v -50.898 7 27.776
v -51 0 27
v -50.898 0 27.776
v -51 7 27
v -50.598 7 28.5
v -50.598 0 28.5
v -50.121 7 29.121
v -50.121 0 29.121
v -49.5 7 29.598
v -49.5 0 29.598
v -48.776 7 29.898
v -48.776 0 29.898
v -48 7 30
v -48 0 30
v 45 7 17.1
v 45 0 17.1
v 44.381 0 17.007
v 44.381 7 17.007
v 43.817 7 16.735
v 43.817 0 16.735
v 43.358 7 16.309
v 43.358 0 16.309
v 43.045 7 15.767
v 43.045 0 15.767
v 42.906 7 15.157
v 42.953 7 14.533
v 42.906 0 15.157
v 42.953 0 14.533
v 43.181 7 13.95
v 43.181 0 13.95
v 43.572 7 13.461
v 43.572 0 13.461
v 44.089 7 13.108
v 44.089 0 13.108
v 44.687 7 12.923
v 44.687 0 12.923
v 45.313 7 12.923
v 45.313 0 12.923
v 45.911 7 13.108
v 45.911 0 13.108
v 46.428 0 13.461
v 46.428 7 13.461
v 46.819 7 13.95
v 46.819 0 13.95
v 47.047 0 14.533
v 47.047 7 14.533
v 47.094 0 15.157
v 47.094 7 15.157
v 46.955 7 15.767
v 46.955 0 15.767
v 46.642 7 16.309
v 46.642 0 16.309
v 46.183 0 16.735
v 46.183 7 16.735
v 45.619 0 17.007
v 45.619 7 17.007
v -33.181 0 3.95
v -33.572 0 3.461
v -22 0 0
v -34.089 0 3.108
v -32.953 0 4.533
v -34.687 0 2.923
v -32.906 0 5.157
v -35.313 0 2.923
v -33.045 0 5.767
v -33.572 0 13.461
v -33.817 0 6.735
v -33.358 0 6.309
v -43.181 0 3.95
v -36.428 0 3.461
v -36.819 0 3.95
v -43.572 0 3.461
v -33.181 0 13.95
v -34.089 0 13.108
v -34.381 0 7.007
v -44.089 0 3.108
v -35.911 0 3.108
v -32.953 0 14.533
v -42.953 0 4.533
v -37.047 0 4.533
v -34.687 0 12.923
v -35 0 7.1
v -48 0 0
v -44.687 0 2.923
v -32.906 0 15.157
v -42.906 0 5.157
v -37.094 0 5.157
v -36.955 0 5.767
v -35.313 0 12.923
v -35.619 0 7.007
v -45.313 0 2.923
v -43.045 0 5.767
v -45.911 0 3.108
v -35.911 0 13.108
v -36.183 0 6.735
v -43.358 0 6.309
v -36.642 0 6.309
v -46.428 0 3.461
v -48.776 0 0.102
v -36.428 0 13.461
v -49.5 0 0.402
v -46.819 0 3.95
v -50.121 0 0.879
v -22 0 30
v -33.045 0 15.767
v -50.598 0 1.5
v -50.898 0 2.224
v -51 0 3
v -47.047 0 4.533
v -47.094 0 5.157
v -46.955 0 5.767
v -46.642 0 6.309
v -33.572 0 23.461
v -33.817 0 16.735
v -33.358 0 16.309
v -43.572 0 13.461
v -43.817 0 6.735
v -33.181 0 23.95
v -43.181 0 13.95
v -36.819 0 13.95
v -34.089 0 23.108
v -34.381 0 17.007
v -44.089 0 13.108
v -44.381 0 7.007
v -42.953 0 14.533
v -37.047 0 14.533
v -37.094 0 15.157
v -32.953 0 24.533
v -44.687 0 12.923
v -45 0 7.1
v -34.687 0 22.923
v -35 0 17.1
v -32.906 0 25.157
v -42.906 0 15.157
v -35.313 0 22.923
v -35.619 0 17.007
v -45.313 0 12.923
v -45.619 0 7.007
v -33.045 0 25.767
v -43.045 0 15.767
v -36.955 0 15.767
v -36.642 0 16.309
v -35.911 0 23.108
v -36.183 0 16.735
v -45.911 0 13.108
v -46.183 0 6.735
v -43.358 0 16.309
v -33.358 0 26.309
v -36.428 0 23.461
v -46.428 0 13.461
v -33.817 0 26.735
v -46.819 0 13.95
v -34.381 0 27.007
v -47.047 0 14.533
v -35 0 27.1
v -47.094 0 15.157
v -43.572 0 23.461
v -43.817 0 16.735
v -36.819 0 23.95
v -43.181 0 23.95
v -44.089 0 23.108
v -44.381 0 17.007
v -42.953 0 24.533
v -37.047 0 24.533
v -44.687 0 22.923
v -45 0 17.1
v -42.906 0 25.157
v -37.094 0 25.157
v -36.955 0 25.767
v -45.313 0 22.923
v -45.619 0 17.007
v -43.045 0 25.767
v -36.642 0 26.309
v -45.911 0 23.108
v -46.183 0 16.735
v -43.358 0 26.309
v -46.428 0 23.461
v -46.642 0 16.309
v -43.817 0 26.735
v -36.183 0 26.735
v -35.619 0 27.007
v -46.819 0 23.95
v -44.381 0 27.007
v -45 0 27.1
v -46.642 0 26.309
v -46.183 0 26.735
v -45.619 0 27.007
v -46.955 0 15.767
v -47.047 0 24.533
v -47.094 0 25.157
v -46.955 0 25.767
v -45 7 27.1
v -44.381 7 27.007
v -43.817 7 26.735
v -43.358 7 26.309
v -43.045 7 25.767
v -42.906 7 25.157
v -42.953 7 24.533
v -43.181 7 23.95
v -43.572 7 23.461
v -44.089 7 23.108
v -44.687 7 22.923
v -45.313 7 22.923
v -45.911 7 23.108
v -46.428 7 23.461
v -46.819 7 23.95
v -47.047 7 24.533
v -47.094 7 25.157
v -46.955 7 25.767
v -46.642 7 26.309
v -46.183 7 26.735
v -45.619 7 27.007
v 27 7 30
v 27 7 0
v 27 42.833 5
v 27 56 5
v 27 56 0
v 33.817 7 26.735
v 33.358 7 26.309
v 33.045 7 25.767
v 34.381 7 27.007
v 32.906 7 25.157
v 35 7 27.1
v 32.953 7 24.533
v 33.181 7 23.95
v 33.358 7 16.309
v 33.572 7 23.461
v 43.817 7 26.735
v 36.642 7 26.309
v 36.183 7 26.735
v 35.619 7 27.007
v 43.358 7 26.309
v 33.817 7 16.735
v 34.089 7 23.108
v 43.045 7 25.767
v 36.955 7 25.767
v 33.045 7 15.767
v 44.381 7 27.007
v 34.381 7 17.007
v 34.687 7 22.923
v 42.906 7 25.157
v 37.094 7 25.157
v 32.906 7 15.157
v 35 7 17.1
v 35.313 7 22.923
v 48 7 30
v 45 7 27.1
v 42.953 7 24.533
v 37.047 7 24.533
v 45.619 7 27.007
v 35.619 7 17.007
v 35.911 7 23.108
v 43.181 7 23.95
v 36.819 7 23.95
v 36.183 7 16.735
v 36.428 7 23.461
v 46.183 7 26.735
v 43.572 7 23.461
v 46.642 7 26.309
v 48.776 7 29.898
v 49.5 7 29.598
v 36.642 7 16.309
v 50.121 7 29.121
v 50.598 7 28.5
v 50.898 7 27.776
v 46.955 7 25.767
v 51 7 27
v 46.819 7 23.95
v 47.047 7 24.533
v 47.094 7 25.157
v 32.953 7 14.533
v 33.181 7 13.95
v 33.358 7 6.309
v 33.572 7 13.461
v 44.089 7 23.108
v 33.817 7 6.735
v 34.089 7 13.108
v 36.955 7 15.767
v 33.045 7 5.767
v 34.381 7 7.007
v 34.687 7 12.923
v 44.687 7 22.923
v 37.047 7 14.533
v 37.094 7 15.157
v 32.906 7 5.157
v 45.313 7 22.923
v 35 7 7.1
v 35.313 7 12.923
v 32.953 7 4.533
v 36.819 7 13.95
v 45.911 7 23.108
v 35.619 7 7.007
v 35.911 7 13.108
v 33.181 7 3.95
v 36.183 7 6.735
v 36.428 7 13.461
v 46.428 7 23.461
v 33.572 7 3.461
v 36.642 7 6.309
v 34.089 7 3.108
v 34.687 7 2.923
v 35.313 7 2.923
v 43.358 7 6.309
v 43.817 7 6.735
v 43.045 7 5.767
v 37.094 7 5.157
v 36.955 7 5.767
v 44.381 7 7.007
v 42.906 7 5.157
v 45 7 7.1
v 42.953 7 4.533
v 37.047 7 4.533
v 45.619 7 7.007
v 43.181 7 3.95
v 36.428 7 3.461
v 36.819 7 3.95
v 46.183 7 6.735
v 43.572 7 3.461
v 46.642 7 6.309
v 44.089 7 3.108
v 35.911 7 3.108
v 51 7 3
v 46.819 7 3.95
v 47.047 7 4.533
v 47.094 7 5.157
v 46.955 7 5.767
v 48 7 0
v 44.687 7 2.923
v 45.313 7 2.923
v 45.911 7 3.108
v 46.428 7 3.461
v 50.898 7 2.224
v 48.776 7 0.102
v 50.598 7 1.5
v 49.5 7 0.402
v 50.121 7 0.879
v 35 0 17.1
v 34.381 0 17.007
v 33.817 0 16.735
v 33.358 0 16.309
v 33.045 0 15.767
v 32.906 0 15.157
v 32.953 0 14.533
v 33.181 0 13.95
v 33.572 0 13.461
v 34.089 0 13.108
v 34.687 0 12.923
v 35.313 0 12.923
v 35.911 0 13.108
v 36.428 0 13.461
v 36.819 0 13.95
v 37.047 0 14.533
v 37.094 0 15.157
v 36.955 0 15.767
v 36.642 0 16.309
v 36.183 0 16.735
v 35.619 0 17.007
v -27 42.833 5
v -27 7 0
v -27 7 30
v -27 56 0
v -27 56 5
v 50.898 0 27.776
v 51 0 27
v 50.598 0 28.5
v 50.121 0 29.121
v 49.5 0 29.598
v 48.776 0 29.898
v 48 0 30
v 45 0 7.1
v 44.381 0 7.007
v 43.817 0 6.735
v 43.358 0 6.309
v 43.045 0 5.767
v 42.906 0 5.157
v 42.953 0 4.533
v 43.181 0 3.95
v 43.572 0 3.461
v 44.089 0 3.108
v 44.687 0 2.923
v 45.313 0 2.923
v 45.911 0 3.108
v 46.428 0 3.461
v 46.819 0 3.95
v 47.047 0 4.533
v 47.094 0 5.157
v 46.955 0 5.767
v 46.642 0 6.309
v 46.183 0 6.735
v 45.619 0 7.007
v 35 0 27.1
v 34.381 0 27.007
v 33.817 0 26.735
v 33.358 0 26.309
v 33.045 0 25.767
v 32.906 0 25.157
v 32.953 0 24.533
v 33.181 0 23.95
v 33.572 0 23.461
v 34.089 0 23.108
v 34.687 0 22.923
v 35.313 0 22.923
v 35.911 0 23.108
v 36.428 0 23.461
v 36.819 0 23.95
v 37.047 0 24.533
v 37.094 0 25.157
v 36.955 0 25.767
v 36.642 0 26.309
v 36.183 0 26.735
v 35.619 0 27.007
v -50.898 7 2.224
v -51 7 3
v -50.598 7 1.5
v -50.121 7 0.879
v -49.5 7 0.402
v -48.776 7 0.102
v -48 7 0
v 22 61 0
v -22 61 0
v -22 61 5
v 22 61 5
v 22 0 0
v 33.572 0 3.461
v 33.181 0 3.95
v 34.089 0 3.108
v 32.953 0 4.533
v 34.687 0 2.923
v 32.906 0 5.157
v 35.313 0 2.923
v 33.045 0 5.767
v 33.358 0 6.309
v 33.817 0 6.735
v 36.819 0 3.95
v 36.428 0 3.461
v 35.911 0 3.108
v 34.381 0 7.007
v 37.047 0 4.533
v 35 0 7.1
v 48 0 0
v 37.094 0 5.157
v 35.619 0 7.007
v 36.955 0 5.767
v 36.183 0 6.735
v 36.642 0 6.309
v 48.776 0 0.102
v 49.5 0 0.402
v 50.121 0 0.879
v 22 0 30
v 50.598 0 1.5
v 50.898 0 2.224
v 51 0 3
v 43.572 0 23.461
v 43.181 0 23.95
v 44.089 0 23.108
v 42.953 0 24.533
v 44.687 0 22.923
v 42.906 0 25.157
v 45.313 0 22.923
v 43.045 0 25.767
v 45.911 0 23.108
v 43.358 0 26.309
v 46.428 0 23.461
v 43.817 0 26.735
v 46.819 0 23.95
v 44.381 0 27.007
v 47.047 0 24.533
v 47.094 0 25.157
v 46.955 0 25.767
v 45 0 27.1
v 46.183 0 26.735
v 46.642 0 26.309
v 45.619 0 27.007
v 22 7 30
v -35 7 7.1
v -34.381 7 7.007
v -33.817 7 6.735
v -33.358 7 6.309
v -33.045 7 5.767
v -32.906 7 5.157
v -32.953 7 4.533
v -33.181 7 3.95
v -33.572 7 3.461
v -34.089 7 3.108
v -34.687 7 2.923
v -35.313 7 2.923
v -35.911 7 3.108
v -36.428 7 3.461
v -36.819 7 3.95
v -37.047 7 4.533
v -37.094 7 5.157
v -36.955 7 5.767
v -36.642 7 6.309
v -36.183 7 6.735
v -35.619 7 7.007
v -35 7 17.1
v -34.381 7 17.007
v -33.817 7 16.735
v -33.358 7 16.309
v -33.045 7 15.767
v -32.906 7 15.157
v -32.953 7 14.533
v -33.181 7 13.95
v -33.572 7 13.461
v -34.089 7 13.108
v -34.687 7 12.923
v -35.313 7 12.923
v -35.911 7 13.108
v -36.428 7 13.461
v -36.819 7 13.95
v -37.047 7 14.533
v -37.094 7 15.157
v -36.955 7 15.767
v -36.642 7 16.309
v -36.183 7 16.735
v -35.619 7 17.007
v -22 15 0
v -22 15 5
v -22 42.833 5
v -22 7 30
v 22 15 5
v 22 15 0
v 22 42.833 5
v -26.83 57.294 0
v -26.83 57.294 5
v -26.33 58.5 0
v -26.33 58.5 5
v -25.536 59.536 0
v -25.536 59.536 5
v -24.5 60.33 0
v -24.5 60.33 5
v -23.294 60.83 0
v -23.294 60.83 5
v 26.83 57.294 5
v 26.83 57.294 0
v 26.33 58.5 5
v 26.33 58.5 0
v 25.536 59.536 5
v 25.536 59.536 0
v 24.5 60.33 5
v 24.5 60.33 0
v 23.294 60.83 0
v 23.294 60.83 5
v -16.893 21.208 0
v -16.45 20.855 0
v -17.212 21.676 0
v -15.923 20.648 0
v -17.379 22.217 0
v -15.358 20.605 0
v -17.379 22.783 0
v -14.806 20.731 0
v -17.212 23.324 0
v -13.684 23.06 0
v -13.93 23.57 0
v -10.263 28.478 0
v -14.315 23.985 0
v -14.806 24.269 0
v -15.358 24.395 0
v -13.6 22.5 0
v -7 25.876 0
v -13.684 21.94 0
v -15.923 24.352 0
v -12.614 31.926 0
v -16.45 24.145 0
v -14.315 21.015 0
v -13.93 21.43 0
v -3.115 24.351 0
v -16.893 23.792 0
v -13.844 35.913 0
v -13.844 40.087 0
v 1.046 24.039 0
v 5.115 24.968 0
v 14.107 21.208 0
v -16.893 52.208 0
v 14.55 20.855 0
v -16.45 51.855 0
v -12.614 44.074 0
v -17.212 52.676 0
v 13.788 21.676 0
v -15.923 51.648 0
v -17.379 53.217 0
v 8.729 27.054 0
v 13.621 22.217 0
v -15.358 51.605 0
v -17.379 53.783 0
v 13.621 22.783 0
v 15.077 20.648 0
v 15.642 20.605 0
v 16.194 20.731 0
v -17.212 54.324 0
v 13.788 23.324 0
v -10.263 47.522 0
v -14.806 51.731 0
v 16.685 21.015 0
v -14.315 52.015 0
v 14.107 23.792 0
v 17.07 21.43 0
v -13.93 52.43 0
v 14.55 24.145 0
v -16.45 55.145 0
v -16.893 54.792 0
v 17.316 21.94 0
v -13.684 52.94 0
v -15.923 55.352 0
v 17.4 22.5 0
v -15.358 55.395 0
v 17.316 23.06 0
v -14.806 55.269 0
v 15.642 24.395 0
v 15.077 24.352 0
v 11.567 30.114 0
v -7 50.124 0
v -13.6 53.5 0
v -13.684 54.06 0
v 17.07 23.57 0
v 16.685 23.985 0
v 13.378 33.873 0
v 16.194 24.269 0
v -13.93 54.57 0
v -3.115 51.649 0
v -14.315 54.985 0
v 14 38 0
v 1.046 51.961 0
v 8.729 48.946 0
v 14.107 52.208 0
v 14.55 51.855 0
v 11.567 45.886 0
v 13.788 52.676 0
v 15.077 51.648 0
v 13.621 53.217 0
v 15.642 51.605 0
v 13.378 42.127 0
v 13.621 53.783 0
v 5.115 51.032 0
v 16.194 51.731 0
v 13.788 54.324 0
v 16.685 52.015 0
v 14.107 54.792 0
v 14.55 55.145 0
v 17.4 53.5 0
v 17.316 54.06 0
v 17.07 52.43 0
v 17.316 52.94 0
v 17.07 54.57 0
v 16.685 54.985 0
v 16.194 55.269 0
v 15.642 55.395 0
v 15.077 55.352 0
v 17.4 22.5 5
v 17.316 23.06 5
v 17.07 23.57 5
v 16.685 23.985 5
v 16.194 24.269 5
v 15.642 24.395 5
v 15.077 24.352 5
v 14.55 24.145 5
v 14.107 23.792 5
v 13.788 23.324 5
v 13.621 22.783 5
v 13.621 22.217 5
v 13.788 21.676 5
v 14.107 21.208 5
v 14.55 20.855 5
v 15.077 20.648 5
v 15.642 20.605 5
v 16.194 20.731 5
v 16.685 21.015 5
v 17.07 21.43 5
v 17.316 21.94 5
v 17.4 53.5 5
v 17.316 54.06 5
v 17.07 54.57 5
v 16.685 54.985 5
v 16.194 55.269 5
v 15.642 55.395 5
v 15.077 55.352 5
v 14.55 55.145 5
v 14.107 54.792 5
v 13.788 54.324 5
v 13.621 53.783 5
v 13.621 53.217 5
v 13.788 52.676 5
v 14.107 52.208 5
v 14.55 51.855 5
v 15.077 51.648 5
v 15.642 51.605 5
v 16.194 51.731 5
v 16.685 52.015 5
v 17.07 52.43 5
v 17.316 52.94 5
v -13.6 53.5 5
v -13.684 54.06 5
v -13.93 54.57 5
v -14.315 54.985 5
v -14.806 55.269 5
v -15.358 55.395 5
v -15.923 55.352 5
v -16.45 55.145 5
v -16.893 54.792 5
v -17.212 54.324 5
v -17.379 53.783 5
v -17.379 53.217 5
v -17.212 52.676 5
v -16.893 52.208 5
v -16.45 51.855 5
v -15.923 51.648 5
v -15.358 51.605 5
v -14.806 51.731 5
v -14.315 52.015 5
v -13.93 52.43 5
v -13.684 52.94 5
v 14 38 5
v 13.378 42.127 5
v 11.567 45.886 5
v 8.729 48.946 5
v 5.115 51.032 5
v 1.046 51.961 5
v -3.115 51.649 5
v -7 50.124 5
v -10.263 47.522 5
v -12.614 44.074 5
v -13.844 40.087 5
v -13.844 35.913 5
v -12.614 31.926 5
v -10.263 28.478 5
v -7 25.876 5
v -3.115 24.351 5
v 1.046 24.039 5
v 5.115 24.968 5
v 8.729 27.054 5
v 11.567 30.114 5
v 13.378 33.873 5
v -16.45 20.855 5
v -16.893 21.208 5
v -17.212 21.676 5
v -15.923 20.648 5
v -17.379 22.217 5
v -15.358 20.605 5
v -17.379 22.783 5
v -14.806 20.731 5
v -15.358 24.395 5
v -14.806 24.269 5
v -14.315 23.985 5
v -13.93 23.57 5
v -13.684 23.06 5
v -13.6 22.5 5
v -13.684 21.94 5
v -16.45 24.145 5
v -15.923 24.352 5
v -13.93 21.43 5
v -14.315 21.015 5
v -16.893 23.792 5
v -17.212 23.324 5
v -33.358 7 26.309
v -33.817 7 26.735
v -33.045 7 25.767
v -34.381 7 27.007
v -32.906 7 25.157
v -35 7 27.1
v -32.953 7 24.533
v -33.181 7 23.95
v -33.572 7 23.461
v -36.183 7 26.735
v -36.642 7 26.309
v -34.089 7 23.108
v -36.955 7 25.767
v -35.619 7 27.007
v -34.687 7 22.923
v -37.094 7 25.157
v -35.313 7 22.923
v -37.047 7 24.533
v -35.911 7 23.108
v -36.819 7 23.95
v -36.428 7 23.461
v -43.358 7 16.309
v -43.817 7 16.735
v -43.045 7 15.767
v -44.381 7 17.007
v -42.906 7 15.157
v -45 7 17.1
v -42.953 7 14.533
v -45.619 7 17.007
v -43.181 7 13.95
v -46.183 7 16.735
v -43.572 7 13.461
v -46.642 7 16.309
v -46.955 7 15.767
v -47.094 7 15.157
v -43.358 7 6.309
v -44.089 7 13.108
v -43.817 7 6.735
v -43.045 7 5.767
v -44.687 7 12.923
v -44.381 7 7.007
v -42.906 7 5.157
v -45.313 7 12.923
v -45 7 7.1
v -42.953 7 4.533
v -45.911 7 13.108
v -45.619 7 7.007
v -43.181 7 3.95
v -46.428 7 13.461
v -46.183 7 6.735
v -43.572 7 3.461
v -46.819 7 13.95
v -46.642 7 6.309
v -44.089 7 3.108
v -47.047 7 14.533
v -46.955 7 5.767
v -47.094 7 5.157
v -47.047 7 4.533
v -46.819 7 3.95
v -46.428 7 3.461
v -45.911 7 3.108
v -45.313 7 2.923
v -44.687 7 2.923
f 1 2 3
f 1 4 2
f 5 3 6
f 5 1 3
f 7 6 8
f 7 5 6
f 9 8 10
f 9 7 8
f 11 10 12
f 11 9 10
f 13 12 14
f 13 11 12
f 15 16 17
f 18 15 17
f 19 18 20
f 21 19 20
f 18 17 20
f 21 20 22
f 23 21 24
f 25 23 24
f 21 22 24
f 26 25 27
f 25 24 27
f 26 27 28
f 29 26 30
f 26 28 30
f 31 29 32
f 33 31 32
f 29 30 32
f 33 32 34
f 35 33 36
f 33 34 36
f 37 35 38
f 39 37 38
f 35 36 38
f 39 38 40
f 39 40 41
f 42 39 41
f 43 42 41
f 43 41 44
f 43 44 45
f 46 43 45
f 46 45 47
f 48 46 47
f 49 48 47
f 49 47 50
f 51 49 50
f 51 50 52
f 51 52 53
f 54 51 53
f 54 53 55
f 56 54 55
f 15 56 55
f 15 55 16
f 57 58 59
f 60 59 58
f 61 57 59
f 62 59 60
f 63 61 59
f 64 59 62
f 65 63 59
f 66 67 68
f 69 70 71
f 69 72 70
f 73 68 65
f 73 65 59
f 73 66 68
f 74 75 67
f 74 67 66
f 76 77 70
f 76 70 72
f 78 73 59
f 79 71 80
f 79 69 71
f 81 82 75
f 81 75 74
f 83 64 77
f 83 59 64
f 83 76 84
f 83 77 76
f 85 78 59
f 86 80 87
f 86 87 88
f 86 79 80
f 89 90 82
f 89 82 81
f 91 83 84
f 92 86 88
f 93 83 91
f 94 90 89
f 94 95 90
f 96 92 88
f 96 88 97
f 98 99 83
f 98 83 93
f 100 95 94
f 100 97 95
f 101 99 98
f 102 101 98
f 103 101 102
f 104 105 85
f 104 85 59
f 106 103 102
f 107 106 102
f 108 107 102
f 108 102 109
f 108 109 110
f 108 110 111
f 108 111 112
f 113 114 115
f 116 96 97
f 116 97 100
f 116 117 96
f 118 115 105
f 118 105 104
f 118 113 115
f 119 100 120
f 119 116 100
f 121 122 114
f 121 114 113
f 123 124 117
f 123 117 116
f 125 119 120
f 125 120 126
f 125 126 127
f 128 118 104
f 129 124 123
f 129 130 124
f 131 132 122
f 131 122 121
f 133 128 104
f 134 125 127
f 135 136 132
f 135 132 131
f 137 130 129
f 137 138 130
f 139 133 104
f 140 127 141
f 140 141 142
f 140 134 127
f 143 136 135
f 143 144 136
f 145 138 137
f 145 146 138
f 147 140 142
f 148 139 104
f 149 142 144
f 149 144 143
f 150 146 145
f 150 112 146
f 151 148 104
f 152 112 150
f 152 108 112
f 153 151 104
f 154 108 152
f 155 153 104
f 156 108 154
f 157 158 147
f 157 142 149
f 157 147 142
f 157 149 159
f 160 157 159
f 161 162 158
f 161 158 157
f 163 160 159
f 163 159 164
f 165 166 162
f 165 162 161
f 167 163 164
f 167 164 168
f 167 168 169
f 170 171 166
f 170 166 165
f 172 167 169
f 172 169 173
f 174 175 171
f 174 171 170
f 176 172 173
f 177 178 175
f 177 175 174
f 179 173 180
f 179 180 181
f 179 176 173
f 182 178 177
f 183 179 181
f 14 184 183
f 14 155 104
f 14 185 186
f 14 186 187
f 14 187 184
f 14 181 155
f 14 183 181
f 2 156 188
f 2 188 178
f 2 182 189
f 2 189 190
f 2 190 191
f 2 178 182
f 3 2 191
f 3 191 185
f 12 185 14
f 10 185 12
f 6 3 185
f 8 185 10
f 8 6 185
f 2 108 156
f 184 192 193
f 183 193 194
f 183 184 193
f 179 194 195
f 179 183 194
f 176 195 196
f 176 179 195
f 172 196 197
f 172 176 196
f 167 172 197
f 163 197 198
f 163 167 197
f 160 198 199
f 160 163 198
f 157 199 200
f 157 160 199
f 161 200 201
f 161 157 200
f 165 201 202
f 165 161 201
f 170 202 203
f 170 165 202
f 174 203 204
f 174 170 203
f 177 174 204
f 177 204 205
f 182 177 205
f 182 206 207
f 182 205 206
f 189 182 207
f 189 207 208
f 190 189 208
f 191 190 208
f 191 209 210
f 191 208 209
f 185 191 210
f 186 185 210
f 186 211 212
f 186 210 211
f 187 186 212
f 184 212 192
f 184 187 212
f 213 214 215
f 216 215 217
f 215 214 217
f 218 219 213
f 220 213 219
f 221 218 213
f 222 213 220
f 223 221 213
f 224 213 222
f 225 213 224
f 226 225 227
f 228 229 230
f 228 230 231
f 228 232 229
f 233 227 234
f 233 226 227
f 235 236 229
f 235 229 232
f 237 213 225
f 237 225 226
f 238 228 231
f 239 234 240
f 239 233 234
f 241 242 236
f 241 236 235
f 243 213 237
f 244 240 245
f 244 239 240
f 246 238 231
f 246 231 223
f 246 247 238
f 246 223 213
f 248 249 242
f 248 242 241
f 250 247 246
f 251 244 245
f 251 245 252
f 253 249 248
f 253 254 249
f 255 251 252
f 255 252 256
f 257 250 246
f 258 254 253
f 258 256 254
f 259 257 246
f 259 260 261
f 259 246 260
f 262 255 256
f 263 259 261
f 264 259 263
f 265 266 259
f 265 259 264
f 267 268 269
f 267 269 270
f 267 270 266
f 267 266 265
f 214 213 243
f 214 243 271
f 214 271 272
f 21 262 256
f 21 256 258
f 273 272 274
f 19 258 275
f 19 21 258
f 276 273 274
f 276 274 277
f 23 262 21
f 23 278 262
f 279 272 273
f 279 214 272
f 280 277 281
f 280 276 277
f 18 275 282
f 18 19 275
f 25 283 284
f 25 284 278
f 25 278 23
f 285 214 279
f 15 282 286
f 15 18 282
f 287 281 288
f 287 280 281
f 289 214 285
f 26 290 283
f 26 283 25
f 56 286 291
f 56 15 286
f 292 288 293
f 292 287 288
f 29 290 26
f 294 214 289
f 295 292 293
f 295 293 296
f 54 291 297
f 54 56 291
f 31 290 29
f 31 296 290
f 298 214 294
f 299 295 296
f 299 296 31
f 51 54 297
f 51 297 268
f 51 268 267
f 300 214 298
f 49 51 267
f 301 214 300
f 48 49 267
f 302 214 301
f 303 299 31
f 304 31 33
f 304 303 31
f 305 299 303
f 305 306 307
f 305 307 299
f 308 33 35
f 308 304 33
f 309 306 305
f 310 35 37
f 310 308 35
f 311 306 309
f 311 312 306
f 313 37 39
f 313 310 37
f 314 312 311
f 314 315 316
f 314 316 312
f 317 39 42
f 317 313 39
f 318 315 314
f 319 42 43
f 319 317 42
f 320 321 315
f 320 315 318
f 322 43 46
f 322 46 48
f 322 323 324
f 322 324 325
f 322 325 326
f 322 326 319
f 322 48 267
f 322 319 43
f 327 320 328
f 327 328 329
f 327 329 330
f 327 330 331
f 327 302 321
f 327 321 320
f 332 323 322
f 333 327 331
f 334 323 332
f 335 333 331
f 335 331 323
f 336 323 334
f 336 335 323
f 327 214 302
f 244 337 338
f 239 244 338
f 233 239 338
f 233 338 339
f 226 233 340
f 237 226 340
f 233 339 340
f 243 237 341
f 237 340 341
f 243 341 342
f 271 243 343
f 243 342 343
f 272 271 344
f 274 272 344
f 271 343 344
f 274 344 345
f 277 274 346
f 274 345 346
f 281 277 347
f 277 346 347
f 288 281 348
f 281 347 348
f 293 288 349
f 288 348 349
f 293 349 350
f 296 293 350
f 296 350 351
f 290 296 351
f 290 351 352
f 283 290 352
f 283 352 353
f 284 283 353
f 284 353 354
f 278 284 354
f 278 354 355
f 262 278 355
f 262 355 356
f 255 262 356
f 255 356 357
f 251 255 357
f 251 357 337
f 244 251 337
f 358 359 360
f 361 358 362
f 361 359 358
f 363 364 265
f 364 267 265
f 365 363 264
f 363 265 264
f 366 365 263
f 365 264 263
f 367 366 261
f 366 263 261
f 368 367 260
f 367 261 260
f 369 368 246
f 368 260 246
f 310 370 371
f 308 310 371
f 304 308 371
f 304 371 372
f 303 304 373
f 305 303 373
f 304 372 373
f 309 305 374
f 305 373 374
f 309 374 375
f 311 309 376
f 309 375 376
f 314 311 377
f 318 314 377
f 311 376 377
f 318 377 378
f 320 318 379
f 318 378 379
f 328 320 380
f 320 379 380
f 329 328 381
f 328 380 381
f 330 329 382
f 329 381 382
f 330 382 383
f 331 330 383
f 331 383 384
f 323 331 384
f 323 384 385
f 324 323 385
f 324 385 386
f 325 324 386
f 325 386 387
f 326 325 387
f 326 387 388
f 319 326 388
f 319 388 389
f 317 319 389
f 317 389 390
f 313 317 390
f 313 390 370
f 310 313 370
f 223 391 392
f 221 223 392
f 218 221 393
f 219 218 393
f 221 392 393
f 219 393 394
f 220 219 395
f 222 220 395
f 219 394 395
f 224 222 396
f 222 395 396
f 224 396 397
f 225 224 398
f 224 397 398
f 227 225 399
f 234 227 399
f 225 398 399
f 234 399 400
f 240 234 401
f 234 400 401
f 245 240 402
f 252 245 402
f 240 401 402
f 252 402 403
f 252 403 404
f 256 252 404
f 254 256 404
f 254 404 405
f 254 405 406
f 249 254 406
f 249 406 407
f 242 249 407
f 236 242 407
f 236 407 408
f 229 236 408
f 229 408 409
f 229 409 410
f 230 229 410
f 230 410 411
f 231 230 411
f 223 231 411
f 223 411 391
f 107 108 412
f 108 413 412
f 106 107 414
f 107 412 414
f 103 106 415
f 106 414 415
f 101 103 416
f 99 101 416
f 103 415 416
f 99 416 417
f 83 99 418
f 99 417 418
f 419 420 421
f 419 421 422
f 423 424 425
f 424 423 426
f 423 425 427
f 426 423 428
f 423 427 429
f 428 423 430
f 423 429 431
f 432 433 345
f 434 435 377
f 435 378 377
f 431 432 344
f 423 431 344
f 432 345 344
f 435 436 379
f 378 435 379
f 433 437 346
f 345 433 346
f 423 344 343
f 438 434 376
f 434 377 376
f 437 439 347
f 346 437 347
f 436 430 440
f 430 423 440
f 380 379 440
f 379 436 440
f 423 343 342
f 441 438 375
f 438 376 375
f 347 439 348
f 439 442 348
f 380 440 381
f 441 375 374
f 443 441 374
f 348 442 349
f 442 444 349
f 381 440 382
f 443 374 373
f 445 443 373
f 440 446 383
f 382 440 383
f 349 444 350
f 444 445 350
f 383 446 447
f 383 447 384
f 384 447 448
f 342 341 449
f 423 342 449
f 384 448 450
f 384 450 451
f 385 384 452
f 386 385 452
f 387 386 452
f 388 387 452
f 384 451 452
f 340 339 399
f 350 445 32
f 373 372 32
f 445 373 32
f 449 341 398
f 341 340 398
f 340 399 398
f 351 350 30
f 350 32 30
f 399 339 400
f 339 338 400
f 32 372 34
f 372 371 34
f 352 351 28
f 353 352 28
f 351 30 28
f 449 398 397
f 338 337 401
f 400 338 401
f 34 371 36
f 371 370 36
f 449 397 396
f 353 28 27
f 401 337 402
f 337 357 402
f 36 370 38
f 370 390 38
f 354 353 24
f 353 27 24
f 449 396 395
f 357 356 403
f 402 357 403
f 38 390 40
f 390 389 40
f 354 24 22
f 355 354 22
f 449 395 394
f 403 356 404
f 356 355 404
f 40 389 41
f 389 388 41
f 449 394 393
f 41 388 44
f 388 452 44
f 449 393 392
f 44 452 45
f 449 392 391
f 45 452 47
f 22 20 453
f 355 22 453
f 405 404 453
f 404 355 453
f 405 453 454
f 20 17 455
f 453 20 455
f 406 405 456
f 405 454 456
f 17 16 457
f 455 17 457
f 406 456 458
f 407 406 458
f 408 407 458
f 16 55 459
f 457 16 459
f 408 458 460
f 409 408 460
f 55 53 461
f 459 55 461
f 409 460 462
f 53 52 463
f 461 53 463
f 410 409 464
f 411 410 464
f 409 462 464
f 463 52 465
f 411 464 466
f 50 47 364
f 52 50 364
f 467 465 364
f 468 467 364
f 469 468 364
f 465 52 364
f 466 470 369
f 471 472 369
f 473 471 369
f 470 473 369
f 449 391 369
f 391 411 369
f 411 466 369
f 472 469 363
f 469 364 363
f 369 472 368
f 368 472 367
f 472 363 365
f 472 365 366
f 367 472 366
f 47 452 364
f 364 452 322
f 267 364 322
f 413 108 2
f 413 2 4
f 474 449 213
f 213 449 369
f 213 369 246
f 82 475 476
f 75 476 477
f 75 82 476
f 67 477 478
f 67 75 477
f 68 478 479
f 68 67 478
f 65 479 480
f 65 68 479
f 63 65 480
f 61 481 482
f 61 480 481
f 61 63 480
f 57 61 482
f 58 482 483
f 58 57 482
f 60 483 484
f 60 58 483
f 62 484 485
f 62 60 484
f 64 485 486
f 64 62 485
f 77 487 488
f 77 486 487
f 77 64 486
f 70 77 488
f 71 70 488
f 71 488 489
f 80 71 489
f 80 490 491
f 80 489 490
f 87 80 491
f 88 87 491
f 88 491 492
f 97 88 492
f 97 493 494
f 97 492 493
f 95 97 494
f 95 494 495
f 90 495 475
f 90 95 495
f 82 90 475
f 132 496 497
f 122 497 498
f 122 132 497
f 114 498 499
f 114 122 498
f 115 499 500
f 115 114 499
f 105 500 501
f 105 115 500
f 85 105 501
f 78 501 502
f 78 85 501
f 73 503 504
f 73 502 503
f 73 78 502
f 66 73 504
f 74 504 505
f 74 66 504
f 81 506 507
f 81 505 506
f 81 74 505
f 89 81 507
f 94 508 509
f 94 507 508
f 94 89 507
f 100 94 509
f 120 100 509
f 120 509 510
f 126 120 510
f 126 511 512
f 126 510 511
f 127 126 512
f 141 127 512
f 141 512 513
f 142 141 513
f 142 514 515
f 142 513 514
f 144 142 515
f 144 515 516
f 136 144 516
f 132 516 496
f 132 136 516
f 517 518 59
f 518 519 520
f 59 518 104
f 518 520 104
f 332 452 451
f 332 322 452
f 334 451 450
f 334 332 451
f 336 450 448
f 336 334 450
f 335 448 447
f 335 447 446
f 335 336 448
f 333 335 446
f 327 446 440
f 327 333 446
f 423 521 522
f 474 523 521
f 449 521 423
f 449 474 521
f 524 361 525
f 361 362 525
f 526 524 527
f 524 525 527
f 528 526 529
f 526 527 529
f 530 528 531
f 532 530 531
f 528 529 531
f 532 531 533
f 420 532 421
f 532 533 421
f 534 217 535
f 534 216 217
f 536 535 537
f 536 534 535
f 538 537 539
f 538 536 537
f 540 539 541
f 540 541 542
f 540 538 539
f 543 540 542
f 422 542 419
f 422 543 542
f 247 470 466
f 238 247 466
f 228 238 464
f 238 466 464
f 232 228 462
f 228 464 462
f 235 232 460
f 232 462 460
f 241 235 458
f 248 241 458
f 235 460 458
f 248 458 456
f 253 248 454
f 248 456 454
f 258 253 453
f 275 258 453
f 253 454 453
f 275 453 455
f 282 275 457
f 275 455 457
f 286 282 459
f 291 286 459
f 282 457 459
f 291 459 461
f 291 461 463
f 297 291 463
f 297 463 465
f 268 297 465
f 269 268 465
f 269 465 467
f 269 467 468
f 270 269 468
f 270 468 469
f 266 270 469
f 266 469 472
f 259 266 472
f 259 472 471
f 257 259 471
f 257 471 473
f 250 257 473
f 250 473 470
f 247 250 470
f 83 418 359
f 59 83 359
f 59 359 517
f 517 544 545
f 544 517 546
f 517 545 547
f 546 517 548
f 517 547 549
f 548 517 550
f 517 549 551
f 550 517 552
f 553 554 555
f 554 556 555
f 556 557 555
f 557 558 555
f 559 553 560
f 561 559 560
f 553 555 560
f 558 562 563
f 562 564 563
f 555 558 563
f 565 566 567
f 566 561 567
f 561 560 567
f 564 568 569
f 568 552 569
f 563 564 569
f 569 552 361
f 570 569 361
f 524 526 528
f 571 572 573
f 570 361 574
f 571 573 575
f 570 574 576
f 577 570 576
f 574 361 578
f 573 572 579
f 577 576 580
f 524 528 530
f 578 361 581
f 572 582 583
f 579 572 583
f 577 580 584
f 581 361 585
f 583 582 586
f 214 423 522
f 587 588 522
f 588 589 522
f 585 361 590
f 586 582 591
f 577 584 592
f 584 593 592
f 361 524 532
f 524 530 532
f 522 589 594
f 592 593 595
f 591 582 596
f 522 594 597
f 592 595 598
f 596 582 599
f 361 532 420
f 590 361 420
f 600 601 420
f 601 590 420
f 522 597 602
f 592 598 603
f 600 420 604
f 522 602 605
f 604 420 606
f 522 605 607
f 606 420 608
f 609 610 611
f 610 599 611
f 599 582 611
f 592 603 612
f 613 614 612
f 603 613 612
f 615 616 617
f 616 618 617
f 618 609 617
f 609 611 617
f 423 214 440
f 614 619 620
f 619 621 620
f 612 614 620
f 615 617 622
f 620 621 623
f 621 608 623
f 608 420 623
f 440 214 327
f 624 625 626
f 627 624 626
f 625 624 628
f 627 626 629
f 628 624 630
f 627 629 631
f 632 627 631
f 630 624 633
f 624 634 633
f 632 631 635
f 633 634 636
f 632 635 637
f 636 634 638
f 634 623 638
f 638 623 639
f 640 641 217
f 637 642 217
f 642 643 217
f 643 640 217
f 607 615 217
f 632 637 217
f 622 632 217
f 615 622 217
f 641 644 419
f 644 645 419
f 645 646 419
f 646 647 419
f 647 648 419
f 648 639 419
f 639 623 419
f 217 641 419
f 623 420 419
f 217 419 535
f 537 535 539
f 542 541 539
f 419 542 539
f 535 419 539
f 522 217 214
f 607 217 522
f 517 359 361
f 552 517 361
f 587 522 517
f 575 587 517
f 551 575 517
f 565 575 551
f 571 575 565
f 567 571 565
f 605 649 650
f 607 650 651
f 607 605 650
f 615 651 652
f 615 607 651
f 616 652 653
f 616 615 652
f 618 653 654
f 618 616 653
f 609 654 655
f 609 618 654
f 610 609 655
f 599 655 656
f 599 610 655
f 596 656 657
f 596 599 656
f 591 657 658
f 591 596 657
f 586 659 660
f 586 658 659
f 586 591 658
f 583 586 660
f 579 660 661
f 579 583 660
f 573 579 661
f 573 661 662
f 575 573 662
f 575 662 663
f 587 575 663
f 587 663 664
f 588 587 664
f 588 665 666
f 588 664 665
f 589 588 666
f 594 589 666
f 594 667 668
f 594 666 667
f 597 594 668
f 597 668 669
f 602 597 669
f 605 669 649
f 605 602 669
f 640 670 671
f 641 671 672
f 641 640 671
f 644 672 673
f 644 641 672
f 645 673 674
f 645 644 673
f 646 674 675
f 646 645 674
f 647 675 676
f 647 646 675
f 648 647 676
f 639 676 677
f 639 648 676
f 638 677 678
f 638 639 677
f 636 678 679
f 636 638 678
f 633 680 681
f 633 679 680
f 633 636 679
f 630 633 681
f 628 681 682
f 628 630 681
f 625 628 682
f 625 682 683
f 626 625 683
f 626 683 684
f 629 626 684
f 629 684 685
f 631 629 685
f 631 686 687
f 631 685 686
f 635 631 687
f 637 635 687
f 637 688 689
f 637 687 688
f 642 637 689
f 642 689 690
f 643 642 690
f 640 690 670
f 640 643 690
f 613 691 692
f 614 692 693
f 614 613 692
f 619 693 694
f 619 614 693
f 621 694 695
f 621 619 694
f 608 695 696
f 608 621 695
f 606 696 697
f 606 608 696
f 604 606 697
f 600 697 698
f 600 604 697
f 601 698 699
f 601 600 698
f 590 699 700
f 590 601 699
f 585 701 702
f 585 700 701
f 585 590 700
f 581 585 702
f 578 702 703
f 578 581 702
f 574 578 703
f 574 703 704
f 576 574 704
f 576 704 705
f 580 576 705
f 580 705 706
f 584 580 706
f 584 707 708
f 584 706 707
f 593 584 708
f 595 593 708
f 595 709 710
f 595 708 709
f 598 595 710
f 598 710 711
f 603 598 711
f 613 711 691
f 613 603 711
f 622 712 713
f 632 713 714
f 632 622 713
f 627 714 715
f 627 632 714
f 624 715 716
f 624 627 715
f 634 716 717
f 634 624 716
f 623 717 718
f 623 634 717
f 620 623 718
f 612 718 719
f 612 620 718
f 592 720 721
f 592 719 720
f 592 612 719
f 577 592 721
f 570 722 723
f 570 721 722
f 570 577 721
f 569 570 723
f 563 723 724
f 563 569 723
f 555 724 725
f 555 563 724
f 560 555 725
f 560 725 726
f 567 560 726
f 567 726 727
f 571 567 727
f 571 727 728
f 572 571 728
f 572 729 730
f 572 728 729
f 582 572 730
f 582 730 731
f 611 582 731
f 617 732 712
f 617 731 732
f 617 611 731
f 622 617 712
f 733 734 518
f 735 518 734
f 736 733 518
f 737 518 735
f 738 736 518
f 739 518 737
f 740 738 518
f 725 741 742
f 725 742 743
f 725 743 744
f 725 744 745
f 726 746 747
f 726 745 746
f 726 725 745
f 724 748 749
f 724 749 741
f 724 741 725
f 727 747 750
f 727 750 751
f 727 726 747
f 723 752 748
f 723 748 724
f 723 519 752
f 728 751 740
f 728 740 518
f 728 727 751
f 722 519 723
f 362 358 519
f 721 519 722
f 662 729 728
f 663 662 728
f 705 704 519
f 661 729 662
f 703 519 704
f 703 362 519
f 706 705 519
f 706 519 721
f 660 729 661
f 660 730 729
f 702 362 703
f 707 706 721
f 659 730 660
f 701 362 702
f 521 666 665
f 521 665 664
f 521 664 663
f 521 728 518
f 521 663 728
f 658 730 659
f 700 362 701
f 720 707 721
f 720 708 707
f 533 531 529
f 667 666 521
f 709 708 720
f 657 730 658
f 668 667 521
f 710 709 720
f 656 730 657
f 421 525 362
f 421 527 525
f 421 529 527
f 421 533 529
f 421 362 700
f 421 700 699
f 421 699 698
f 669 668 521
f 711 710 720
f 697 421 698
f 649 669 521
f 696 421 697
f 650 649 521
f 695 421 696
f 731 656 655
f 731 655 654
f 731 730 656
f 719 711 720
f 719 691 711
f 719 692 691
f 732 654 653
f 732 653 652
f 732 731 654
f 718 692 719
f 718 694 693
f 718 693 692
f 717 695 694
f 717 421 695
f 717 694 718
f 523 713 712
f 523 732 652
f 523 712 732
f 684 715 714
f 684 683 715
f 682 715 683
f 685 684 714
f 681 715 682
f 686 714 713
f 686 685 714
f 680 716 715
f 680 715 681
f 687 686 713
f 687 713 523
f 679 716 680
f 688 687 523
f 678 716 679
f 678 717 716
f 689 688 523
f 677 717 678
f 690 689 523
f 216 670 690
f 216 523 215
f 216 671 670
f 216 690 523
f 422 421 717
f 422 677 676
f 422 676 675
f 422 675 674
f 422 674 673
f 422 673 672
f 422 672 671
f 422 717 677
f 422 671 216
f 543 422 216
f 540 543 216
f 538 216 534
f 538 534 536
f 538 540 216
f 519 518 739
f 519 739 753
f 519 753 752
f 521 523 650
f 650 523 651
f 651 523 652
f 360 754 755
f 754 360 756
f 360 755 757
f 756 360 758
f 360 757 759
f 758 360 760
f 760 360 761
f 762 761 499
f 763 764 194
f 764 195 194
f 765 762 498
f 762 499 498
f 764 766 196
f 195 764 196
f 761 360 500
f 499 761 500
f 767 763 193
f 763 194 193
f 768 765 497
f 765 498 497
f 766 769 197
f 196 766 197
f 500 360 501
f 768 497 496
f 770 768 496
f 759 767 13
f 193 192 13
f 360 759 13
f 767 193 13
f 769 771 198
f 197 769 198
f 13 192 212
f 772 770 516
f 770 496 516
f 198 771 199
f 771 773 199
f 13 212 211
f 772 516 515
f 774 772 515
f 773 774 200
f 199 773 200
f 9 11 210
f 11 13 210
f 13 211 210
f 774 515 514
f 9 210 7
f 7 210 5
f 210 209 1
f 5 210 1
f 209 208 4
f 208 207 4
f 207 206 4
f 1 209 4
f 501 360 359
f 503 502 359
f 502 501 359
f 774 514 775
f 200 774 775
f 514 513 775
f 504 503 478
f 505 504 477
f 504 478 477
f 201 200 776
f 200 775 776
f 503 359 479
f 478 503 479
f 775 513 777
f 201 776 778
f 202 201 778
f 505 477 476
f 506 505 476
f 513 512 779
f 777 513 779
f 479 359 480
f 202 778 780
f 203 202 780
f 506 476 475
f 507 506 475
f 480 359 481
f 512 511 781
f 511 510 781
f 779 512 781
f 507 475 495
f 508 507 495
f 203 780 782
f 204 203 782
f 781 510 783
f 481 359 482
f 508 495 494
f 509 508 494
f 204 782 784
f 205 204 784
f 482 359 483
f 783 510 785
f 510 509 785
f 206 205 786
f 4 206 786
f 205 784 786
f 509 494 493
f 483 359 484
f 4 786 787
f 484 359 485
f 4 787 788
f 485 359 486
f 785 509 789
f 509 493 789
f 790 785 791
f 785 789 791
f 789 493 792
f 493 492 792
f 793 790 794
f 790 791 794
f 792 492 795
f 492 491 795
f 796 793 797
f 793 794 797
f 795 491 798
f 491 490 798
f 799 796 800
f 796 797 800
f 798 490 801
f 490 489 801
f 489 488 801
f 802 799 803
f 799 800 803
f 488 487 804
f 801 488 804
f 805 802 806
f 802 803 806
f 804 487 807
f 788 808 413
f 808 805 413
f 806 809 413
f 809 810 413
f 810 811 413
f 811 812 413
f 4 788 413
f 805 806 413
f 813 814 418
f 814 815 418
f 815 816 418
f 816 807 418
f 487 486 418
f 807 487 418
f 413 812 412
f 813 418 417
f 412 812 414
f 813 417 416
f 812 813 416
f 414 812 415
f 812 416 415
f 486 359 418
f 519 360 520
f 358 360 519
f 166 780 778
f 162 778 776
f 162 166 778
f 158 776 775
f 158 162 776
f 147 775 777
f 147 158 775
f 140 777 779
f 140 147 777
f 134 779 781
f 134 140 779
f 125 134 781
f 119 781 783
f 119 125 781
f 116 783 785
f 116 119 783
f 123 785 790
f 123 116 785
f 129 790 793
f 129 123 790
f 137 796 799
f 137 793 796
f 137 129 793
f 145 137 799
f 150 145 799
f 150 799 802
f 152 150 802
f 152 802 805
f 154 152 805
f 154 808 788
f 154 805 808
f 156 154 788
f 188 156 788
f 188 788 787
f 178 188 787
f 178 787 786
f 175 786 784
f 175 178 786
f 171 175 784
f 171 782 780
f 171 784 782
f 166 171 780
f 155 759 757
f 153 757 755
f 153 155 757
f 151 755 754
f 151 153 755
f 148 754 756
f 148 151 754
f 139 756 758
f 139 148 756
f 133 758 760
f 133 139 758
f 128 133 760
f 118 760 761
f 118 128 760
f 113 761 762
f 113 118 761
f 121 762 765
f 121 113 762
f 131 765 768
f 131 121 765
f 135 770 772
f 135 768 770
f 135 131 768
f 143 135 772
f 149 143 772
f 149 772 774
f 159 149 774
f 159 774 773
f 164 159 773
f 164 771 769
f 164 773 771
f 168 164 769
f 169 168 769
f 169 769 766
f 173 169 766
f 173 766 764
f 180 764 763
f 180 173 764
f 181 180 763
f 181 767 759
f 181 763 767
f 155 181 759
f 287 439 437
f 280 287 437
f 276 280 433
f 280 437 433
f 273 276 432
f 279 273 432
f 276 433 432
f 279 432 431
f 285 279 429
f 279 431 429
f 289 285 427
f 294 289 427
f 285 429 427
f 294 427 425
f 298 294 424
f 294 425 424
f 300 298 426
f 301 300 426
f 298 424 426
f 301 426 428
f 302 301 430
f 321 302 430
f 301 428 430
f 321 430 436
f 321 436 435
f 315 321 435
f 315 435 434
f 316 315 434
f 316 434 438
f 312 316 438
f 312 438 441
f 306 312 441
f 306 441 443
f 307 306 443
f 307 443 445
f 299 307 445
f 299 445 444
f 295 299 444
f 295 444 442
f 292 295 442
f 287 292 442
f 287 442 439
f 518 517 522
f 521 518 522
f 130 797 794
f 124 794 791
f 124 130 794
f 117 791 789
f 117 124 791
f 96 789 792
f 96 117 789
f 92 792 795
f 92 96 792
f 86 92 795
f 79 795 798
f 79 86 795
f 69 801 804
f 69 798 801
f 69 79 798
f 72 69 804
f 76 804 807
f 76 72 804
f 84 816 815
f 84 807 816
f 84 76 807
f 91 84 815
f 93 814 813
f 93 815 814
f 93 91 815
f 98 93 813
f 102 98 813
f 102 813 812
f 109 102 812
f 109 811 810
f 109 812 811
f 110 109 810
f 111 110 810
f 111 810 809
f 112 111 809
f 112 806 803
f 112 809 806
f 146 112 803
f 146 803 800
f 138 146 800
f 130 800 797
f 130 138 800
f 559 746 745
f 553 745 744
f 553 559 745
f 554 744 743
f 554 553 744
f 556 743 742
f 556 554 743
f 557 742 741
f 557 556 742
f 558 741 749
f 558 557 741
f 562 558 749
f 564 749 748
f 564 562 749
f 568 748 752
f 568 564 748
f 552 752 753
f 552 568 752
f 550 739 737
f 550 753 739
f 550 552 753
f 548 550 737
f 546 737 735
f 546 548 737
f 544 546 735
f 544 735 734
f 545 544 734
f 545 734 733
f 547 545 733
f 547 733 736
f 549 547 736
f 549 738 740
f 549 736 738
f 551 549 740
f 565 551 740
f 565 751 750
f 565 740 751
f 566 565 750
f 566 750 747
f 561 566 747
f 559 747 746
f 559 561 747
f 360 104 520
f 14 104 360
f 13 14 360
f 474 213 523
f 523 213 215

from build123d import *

# Parameters (mm, degrees)
CYLINDER006_R        = 1.9
CYLINDER006_DEPTH    = 10
ARRAY_X_COUNT        = 2
ARRAY_X_PITCH        = 31
ARRAY_Y_COUNT        = 2
ARRAY_Y_PITCH        = 31
CYLINDER009_R        = 2.1
CYLINDER009_DEPTH    = 10
ARRAY002_X_COUNT     = 3
ARRAY002_X_PITCH     = 10
ARRAY002_Y_COUNT     = 2
ARRAY002_Y_PITCH     = 10
BODY_PITCH_ANGLE     = -90
BODY_PLACEMENT_ANGLE = -90
CYLINDER005_R        = 14
CYLINDER005_DEPTH    = 20
PAD_DEPTH            = 5
BOX004_W             = 24
BOX004_H             = 7
BOX004_DEPTH         = 30
FILLET004_R          = 3
BOX003_W             = 54
BOX003_H             = 46
BOX003_DEPTH         = 5
FILLET001_R          = 5


with BuildPart() as stepper_bolt_hole_array:
    # Cylinder006 → Cylinder006 (new body)
    with BuildSketch(Plane(origin=(0, 38, 0), x_dir=(1, 0, 0), z_dir=(0, 0, 1))):
        Circle(CYLINDER006_R)
    extrude(amount=CYLINDER006_DEPTH)

    # Array X: stepper bolt hole array ×2


with BuildPart() as stepper_bolt_hole_array_1:
    add(stepper_bolt_hole_array.part)
    with Locations(*[(i * ARRAY_X_PITCH, 0, 0) for i in range(1, ARRAY_X_COUNT)]):
        add(stepper_bolt_hole_array.part)

    # Array Y: stepper bolt hole array ×2


with BuildPart() as stepper_bolt_hole_array_2:
    add(stepper_bolt_hole_array_1.part)
    with Locations(*[(0, i * ARRAY_Y_PITCH, 0) for i in range(1, ARRAY_Y_COUNT)]):
        add(stepper_bolt_hole_array_1.part)


with BuildPart() as stepper_bolt_hole_array_3:
    # Array placement: moved
    add(stepper_bolt_hole_array_2.part.moved(Location((-15.5, -15.5, 0))))


with BuildPart() as holdert_hole_clone:
    # Cylinder009 → Cylinder009 (new body)
    with BuildSketch(Plane.XY):
        Circle(CYLINDER009_R)
    extrude(amount=CYLINDER009_DEPTH)

    # Array002 X: holdert hole clone ×3


with BuildPart() as holdert_hole_clone_1:
    add(holdert_hole_clone.part)
    with Locations(*[(i * ARRAY002_X_PITCH, 0, 0) for i in range(1, ARRAY002_X_COUNT)]):
        add(holdert_hole_clone.part)

    # Array002 Y: holdert hole clone ×2


with BuildPart() as holdert_hole_clone_2:
    add(holdert_hole_clone_1.part)
    with Locations(*[(0, i * ARRAY002_Y_PITCH, 0) for i in range(1, ARRAY002_Y_COUNT)]):
        add(holdert_hole_clone_1.part)


with BuildPart() as holdert_hole_clone_3:
    # Body pitch: moved
    add(holdert_hole_clone_2.part.rotate(Axis((0, 0, 0), (0, 1, 0)), BODY_PITCH_ANGLE))


with BuildPart() as holdert_hole_clone_4:
    # Body placement: moved
    add(holdert_hole_clone_3.part.moved(Location((-45, 0, 5))).rotate(Axis((-45, 0, 5), (0, 0, 1)), BODY_PLACEMENT_ANGLE))


with BuildPart() as part_mirroring005:
    # Part__Mirroring005: instance of holdert hole clone
    add(holdert_hole_clone_4.part.mirror(Plane(origin=(0, 0, 0), x_dir=(0, -1, 0), z_dir=(1, 0, 0))))


with BuildPart() as stepper_wall_extract_fusion:
    # Cylinder005 → Cylinder005 (new body)
    with BuildSketch(Plane(origin=(0, 38, 0), x_dir=(1, 0, 0), z_dir=(0, 0, 1))):
        Circle(CYLINDER005_R)
    extrude(amount=CYLINDER005_DEPTH)

    # Fusion006: union stepper bolt hole array, Part__Mirroring005, holdert hole clone
    add(stepper_bolt_hole_array_3.part)
    add(part_mirroring005.part)
    add(holdert_hole_clone_4.part)


with BuildPart() as side_body:
    # Sketch → Pad (new body)
    with BuildSketch(Plane.YZ):
        Polygon((50, 0), (0, 0), (0, 30), (7, 30), align=None)
    extrude(amount=-PAD_DEPTH)


with BuildPart() as side_body_1:
    # Body001 placement: moved
    add(side_body.part.moved(Location((27, 0, 0))))


with BuildPart() as side_body_fusion:
    # Part__Mirroring002: instance of side body
    add(side_body_1.part.mirror(Plane(origin=(0, 0, 0), x_dir=(0, -1, 0), z_dir=(1, 0, 0))))

    # Fusion009: union side body
    add(side_body_1.part)


with BuildPart() as stepper_top_wall_fillet:
    # Box004 → Box004 (new body)
    with BuildSketch(Plane(origin=(27, 0, 0), x_dir=(1, 0, 0), z_dir=(0, 0, 1))):
        with Locations((12, 3.5)):
            Rectangle(BOX004_W, BOX004_H)
    extrude(amount=BOX004_DEPTH)

    # Fillet004
    fillet004_edges = [stepper_top_wall_fillet.edges().sort_by_distance(p)[0] for p in [
        (51, 3.5, 30),
        (51, 3.5, 0),
    ]]
    fillet(fillet004_edges, radius=FILLET004_R)


with BuildPart() as part_mirroring003:
    # Part__Mirroring003: instance of stepper top wall fillet
    add(stepper_top_wall_fillet.part.mirror(Plane(origin=(0, 0, 0), x_dir=(0, -1, 0), z_dir=(1, 0, 0))))


with BuildPart() as stepper_holder_cut:
    # Box003 → Box003 (new body)
    with BuildSketch(Plane(origin=(-27, 15, 0), x_dir=(1, 0, 0), z_dir=(0, 0, 1))):
        with Locations((27, 23)):
            Rectangle(BOX003_W, BOX003_H)
    extrude(amount=BOX003_DEPTH)

    # Fillet001
    fillet001_edges = [stepper_holder_cut.edges().sort_by_distance(p)[0] for p in [
        (-27, 61, 2.5),
        (27, 61, 2.5),
    ]]
    fillet(fillet001_edges, radius=FILLET001_R)

    # Fusion007: union stepper top wall fillet, Part__Mirroring003
    add(stepper_top_wall_fillet.part)
    add(part_mirroring003.part)

    # Fusion010: union side body fusion
    add(side_body_fusion.part)

    # Cut004002: cut stepper wall extract fusion
    add(stepper_wall_extract_fusion.part, mode=Mode.SUBTRACT)


solid = stepper_holder_cut.part
